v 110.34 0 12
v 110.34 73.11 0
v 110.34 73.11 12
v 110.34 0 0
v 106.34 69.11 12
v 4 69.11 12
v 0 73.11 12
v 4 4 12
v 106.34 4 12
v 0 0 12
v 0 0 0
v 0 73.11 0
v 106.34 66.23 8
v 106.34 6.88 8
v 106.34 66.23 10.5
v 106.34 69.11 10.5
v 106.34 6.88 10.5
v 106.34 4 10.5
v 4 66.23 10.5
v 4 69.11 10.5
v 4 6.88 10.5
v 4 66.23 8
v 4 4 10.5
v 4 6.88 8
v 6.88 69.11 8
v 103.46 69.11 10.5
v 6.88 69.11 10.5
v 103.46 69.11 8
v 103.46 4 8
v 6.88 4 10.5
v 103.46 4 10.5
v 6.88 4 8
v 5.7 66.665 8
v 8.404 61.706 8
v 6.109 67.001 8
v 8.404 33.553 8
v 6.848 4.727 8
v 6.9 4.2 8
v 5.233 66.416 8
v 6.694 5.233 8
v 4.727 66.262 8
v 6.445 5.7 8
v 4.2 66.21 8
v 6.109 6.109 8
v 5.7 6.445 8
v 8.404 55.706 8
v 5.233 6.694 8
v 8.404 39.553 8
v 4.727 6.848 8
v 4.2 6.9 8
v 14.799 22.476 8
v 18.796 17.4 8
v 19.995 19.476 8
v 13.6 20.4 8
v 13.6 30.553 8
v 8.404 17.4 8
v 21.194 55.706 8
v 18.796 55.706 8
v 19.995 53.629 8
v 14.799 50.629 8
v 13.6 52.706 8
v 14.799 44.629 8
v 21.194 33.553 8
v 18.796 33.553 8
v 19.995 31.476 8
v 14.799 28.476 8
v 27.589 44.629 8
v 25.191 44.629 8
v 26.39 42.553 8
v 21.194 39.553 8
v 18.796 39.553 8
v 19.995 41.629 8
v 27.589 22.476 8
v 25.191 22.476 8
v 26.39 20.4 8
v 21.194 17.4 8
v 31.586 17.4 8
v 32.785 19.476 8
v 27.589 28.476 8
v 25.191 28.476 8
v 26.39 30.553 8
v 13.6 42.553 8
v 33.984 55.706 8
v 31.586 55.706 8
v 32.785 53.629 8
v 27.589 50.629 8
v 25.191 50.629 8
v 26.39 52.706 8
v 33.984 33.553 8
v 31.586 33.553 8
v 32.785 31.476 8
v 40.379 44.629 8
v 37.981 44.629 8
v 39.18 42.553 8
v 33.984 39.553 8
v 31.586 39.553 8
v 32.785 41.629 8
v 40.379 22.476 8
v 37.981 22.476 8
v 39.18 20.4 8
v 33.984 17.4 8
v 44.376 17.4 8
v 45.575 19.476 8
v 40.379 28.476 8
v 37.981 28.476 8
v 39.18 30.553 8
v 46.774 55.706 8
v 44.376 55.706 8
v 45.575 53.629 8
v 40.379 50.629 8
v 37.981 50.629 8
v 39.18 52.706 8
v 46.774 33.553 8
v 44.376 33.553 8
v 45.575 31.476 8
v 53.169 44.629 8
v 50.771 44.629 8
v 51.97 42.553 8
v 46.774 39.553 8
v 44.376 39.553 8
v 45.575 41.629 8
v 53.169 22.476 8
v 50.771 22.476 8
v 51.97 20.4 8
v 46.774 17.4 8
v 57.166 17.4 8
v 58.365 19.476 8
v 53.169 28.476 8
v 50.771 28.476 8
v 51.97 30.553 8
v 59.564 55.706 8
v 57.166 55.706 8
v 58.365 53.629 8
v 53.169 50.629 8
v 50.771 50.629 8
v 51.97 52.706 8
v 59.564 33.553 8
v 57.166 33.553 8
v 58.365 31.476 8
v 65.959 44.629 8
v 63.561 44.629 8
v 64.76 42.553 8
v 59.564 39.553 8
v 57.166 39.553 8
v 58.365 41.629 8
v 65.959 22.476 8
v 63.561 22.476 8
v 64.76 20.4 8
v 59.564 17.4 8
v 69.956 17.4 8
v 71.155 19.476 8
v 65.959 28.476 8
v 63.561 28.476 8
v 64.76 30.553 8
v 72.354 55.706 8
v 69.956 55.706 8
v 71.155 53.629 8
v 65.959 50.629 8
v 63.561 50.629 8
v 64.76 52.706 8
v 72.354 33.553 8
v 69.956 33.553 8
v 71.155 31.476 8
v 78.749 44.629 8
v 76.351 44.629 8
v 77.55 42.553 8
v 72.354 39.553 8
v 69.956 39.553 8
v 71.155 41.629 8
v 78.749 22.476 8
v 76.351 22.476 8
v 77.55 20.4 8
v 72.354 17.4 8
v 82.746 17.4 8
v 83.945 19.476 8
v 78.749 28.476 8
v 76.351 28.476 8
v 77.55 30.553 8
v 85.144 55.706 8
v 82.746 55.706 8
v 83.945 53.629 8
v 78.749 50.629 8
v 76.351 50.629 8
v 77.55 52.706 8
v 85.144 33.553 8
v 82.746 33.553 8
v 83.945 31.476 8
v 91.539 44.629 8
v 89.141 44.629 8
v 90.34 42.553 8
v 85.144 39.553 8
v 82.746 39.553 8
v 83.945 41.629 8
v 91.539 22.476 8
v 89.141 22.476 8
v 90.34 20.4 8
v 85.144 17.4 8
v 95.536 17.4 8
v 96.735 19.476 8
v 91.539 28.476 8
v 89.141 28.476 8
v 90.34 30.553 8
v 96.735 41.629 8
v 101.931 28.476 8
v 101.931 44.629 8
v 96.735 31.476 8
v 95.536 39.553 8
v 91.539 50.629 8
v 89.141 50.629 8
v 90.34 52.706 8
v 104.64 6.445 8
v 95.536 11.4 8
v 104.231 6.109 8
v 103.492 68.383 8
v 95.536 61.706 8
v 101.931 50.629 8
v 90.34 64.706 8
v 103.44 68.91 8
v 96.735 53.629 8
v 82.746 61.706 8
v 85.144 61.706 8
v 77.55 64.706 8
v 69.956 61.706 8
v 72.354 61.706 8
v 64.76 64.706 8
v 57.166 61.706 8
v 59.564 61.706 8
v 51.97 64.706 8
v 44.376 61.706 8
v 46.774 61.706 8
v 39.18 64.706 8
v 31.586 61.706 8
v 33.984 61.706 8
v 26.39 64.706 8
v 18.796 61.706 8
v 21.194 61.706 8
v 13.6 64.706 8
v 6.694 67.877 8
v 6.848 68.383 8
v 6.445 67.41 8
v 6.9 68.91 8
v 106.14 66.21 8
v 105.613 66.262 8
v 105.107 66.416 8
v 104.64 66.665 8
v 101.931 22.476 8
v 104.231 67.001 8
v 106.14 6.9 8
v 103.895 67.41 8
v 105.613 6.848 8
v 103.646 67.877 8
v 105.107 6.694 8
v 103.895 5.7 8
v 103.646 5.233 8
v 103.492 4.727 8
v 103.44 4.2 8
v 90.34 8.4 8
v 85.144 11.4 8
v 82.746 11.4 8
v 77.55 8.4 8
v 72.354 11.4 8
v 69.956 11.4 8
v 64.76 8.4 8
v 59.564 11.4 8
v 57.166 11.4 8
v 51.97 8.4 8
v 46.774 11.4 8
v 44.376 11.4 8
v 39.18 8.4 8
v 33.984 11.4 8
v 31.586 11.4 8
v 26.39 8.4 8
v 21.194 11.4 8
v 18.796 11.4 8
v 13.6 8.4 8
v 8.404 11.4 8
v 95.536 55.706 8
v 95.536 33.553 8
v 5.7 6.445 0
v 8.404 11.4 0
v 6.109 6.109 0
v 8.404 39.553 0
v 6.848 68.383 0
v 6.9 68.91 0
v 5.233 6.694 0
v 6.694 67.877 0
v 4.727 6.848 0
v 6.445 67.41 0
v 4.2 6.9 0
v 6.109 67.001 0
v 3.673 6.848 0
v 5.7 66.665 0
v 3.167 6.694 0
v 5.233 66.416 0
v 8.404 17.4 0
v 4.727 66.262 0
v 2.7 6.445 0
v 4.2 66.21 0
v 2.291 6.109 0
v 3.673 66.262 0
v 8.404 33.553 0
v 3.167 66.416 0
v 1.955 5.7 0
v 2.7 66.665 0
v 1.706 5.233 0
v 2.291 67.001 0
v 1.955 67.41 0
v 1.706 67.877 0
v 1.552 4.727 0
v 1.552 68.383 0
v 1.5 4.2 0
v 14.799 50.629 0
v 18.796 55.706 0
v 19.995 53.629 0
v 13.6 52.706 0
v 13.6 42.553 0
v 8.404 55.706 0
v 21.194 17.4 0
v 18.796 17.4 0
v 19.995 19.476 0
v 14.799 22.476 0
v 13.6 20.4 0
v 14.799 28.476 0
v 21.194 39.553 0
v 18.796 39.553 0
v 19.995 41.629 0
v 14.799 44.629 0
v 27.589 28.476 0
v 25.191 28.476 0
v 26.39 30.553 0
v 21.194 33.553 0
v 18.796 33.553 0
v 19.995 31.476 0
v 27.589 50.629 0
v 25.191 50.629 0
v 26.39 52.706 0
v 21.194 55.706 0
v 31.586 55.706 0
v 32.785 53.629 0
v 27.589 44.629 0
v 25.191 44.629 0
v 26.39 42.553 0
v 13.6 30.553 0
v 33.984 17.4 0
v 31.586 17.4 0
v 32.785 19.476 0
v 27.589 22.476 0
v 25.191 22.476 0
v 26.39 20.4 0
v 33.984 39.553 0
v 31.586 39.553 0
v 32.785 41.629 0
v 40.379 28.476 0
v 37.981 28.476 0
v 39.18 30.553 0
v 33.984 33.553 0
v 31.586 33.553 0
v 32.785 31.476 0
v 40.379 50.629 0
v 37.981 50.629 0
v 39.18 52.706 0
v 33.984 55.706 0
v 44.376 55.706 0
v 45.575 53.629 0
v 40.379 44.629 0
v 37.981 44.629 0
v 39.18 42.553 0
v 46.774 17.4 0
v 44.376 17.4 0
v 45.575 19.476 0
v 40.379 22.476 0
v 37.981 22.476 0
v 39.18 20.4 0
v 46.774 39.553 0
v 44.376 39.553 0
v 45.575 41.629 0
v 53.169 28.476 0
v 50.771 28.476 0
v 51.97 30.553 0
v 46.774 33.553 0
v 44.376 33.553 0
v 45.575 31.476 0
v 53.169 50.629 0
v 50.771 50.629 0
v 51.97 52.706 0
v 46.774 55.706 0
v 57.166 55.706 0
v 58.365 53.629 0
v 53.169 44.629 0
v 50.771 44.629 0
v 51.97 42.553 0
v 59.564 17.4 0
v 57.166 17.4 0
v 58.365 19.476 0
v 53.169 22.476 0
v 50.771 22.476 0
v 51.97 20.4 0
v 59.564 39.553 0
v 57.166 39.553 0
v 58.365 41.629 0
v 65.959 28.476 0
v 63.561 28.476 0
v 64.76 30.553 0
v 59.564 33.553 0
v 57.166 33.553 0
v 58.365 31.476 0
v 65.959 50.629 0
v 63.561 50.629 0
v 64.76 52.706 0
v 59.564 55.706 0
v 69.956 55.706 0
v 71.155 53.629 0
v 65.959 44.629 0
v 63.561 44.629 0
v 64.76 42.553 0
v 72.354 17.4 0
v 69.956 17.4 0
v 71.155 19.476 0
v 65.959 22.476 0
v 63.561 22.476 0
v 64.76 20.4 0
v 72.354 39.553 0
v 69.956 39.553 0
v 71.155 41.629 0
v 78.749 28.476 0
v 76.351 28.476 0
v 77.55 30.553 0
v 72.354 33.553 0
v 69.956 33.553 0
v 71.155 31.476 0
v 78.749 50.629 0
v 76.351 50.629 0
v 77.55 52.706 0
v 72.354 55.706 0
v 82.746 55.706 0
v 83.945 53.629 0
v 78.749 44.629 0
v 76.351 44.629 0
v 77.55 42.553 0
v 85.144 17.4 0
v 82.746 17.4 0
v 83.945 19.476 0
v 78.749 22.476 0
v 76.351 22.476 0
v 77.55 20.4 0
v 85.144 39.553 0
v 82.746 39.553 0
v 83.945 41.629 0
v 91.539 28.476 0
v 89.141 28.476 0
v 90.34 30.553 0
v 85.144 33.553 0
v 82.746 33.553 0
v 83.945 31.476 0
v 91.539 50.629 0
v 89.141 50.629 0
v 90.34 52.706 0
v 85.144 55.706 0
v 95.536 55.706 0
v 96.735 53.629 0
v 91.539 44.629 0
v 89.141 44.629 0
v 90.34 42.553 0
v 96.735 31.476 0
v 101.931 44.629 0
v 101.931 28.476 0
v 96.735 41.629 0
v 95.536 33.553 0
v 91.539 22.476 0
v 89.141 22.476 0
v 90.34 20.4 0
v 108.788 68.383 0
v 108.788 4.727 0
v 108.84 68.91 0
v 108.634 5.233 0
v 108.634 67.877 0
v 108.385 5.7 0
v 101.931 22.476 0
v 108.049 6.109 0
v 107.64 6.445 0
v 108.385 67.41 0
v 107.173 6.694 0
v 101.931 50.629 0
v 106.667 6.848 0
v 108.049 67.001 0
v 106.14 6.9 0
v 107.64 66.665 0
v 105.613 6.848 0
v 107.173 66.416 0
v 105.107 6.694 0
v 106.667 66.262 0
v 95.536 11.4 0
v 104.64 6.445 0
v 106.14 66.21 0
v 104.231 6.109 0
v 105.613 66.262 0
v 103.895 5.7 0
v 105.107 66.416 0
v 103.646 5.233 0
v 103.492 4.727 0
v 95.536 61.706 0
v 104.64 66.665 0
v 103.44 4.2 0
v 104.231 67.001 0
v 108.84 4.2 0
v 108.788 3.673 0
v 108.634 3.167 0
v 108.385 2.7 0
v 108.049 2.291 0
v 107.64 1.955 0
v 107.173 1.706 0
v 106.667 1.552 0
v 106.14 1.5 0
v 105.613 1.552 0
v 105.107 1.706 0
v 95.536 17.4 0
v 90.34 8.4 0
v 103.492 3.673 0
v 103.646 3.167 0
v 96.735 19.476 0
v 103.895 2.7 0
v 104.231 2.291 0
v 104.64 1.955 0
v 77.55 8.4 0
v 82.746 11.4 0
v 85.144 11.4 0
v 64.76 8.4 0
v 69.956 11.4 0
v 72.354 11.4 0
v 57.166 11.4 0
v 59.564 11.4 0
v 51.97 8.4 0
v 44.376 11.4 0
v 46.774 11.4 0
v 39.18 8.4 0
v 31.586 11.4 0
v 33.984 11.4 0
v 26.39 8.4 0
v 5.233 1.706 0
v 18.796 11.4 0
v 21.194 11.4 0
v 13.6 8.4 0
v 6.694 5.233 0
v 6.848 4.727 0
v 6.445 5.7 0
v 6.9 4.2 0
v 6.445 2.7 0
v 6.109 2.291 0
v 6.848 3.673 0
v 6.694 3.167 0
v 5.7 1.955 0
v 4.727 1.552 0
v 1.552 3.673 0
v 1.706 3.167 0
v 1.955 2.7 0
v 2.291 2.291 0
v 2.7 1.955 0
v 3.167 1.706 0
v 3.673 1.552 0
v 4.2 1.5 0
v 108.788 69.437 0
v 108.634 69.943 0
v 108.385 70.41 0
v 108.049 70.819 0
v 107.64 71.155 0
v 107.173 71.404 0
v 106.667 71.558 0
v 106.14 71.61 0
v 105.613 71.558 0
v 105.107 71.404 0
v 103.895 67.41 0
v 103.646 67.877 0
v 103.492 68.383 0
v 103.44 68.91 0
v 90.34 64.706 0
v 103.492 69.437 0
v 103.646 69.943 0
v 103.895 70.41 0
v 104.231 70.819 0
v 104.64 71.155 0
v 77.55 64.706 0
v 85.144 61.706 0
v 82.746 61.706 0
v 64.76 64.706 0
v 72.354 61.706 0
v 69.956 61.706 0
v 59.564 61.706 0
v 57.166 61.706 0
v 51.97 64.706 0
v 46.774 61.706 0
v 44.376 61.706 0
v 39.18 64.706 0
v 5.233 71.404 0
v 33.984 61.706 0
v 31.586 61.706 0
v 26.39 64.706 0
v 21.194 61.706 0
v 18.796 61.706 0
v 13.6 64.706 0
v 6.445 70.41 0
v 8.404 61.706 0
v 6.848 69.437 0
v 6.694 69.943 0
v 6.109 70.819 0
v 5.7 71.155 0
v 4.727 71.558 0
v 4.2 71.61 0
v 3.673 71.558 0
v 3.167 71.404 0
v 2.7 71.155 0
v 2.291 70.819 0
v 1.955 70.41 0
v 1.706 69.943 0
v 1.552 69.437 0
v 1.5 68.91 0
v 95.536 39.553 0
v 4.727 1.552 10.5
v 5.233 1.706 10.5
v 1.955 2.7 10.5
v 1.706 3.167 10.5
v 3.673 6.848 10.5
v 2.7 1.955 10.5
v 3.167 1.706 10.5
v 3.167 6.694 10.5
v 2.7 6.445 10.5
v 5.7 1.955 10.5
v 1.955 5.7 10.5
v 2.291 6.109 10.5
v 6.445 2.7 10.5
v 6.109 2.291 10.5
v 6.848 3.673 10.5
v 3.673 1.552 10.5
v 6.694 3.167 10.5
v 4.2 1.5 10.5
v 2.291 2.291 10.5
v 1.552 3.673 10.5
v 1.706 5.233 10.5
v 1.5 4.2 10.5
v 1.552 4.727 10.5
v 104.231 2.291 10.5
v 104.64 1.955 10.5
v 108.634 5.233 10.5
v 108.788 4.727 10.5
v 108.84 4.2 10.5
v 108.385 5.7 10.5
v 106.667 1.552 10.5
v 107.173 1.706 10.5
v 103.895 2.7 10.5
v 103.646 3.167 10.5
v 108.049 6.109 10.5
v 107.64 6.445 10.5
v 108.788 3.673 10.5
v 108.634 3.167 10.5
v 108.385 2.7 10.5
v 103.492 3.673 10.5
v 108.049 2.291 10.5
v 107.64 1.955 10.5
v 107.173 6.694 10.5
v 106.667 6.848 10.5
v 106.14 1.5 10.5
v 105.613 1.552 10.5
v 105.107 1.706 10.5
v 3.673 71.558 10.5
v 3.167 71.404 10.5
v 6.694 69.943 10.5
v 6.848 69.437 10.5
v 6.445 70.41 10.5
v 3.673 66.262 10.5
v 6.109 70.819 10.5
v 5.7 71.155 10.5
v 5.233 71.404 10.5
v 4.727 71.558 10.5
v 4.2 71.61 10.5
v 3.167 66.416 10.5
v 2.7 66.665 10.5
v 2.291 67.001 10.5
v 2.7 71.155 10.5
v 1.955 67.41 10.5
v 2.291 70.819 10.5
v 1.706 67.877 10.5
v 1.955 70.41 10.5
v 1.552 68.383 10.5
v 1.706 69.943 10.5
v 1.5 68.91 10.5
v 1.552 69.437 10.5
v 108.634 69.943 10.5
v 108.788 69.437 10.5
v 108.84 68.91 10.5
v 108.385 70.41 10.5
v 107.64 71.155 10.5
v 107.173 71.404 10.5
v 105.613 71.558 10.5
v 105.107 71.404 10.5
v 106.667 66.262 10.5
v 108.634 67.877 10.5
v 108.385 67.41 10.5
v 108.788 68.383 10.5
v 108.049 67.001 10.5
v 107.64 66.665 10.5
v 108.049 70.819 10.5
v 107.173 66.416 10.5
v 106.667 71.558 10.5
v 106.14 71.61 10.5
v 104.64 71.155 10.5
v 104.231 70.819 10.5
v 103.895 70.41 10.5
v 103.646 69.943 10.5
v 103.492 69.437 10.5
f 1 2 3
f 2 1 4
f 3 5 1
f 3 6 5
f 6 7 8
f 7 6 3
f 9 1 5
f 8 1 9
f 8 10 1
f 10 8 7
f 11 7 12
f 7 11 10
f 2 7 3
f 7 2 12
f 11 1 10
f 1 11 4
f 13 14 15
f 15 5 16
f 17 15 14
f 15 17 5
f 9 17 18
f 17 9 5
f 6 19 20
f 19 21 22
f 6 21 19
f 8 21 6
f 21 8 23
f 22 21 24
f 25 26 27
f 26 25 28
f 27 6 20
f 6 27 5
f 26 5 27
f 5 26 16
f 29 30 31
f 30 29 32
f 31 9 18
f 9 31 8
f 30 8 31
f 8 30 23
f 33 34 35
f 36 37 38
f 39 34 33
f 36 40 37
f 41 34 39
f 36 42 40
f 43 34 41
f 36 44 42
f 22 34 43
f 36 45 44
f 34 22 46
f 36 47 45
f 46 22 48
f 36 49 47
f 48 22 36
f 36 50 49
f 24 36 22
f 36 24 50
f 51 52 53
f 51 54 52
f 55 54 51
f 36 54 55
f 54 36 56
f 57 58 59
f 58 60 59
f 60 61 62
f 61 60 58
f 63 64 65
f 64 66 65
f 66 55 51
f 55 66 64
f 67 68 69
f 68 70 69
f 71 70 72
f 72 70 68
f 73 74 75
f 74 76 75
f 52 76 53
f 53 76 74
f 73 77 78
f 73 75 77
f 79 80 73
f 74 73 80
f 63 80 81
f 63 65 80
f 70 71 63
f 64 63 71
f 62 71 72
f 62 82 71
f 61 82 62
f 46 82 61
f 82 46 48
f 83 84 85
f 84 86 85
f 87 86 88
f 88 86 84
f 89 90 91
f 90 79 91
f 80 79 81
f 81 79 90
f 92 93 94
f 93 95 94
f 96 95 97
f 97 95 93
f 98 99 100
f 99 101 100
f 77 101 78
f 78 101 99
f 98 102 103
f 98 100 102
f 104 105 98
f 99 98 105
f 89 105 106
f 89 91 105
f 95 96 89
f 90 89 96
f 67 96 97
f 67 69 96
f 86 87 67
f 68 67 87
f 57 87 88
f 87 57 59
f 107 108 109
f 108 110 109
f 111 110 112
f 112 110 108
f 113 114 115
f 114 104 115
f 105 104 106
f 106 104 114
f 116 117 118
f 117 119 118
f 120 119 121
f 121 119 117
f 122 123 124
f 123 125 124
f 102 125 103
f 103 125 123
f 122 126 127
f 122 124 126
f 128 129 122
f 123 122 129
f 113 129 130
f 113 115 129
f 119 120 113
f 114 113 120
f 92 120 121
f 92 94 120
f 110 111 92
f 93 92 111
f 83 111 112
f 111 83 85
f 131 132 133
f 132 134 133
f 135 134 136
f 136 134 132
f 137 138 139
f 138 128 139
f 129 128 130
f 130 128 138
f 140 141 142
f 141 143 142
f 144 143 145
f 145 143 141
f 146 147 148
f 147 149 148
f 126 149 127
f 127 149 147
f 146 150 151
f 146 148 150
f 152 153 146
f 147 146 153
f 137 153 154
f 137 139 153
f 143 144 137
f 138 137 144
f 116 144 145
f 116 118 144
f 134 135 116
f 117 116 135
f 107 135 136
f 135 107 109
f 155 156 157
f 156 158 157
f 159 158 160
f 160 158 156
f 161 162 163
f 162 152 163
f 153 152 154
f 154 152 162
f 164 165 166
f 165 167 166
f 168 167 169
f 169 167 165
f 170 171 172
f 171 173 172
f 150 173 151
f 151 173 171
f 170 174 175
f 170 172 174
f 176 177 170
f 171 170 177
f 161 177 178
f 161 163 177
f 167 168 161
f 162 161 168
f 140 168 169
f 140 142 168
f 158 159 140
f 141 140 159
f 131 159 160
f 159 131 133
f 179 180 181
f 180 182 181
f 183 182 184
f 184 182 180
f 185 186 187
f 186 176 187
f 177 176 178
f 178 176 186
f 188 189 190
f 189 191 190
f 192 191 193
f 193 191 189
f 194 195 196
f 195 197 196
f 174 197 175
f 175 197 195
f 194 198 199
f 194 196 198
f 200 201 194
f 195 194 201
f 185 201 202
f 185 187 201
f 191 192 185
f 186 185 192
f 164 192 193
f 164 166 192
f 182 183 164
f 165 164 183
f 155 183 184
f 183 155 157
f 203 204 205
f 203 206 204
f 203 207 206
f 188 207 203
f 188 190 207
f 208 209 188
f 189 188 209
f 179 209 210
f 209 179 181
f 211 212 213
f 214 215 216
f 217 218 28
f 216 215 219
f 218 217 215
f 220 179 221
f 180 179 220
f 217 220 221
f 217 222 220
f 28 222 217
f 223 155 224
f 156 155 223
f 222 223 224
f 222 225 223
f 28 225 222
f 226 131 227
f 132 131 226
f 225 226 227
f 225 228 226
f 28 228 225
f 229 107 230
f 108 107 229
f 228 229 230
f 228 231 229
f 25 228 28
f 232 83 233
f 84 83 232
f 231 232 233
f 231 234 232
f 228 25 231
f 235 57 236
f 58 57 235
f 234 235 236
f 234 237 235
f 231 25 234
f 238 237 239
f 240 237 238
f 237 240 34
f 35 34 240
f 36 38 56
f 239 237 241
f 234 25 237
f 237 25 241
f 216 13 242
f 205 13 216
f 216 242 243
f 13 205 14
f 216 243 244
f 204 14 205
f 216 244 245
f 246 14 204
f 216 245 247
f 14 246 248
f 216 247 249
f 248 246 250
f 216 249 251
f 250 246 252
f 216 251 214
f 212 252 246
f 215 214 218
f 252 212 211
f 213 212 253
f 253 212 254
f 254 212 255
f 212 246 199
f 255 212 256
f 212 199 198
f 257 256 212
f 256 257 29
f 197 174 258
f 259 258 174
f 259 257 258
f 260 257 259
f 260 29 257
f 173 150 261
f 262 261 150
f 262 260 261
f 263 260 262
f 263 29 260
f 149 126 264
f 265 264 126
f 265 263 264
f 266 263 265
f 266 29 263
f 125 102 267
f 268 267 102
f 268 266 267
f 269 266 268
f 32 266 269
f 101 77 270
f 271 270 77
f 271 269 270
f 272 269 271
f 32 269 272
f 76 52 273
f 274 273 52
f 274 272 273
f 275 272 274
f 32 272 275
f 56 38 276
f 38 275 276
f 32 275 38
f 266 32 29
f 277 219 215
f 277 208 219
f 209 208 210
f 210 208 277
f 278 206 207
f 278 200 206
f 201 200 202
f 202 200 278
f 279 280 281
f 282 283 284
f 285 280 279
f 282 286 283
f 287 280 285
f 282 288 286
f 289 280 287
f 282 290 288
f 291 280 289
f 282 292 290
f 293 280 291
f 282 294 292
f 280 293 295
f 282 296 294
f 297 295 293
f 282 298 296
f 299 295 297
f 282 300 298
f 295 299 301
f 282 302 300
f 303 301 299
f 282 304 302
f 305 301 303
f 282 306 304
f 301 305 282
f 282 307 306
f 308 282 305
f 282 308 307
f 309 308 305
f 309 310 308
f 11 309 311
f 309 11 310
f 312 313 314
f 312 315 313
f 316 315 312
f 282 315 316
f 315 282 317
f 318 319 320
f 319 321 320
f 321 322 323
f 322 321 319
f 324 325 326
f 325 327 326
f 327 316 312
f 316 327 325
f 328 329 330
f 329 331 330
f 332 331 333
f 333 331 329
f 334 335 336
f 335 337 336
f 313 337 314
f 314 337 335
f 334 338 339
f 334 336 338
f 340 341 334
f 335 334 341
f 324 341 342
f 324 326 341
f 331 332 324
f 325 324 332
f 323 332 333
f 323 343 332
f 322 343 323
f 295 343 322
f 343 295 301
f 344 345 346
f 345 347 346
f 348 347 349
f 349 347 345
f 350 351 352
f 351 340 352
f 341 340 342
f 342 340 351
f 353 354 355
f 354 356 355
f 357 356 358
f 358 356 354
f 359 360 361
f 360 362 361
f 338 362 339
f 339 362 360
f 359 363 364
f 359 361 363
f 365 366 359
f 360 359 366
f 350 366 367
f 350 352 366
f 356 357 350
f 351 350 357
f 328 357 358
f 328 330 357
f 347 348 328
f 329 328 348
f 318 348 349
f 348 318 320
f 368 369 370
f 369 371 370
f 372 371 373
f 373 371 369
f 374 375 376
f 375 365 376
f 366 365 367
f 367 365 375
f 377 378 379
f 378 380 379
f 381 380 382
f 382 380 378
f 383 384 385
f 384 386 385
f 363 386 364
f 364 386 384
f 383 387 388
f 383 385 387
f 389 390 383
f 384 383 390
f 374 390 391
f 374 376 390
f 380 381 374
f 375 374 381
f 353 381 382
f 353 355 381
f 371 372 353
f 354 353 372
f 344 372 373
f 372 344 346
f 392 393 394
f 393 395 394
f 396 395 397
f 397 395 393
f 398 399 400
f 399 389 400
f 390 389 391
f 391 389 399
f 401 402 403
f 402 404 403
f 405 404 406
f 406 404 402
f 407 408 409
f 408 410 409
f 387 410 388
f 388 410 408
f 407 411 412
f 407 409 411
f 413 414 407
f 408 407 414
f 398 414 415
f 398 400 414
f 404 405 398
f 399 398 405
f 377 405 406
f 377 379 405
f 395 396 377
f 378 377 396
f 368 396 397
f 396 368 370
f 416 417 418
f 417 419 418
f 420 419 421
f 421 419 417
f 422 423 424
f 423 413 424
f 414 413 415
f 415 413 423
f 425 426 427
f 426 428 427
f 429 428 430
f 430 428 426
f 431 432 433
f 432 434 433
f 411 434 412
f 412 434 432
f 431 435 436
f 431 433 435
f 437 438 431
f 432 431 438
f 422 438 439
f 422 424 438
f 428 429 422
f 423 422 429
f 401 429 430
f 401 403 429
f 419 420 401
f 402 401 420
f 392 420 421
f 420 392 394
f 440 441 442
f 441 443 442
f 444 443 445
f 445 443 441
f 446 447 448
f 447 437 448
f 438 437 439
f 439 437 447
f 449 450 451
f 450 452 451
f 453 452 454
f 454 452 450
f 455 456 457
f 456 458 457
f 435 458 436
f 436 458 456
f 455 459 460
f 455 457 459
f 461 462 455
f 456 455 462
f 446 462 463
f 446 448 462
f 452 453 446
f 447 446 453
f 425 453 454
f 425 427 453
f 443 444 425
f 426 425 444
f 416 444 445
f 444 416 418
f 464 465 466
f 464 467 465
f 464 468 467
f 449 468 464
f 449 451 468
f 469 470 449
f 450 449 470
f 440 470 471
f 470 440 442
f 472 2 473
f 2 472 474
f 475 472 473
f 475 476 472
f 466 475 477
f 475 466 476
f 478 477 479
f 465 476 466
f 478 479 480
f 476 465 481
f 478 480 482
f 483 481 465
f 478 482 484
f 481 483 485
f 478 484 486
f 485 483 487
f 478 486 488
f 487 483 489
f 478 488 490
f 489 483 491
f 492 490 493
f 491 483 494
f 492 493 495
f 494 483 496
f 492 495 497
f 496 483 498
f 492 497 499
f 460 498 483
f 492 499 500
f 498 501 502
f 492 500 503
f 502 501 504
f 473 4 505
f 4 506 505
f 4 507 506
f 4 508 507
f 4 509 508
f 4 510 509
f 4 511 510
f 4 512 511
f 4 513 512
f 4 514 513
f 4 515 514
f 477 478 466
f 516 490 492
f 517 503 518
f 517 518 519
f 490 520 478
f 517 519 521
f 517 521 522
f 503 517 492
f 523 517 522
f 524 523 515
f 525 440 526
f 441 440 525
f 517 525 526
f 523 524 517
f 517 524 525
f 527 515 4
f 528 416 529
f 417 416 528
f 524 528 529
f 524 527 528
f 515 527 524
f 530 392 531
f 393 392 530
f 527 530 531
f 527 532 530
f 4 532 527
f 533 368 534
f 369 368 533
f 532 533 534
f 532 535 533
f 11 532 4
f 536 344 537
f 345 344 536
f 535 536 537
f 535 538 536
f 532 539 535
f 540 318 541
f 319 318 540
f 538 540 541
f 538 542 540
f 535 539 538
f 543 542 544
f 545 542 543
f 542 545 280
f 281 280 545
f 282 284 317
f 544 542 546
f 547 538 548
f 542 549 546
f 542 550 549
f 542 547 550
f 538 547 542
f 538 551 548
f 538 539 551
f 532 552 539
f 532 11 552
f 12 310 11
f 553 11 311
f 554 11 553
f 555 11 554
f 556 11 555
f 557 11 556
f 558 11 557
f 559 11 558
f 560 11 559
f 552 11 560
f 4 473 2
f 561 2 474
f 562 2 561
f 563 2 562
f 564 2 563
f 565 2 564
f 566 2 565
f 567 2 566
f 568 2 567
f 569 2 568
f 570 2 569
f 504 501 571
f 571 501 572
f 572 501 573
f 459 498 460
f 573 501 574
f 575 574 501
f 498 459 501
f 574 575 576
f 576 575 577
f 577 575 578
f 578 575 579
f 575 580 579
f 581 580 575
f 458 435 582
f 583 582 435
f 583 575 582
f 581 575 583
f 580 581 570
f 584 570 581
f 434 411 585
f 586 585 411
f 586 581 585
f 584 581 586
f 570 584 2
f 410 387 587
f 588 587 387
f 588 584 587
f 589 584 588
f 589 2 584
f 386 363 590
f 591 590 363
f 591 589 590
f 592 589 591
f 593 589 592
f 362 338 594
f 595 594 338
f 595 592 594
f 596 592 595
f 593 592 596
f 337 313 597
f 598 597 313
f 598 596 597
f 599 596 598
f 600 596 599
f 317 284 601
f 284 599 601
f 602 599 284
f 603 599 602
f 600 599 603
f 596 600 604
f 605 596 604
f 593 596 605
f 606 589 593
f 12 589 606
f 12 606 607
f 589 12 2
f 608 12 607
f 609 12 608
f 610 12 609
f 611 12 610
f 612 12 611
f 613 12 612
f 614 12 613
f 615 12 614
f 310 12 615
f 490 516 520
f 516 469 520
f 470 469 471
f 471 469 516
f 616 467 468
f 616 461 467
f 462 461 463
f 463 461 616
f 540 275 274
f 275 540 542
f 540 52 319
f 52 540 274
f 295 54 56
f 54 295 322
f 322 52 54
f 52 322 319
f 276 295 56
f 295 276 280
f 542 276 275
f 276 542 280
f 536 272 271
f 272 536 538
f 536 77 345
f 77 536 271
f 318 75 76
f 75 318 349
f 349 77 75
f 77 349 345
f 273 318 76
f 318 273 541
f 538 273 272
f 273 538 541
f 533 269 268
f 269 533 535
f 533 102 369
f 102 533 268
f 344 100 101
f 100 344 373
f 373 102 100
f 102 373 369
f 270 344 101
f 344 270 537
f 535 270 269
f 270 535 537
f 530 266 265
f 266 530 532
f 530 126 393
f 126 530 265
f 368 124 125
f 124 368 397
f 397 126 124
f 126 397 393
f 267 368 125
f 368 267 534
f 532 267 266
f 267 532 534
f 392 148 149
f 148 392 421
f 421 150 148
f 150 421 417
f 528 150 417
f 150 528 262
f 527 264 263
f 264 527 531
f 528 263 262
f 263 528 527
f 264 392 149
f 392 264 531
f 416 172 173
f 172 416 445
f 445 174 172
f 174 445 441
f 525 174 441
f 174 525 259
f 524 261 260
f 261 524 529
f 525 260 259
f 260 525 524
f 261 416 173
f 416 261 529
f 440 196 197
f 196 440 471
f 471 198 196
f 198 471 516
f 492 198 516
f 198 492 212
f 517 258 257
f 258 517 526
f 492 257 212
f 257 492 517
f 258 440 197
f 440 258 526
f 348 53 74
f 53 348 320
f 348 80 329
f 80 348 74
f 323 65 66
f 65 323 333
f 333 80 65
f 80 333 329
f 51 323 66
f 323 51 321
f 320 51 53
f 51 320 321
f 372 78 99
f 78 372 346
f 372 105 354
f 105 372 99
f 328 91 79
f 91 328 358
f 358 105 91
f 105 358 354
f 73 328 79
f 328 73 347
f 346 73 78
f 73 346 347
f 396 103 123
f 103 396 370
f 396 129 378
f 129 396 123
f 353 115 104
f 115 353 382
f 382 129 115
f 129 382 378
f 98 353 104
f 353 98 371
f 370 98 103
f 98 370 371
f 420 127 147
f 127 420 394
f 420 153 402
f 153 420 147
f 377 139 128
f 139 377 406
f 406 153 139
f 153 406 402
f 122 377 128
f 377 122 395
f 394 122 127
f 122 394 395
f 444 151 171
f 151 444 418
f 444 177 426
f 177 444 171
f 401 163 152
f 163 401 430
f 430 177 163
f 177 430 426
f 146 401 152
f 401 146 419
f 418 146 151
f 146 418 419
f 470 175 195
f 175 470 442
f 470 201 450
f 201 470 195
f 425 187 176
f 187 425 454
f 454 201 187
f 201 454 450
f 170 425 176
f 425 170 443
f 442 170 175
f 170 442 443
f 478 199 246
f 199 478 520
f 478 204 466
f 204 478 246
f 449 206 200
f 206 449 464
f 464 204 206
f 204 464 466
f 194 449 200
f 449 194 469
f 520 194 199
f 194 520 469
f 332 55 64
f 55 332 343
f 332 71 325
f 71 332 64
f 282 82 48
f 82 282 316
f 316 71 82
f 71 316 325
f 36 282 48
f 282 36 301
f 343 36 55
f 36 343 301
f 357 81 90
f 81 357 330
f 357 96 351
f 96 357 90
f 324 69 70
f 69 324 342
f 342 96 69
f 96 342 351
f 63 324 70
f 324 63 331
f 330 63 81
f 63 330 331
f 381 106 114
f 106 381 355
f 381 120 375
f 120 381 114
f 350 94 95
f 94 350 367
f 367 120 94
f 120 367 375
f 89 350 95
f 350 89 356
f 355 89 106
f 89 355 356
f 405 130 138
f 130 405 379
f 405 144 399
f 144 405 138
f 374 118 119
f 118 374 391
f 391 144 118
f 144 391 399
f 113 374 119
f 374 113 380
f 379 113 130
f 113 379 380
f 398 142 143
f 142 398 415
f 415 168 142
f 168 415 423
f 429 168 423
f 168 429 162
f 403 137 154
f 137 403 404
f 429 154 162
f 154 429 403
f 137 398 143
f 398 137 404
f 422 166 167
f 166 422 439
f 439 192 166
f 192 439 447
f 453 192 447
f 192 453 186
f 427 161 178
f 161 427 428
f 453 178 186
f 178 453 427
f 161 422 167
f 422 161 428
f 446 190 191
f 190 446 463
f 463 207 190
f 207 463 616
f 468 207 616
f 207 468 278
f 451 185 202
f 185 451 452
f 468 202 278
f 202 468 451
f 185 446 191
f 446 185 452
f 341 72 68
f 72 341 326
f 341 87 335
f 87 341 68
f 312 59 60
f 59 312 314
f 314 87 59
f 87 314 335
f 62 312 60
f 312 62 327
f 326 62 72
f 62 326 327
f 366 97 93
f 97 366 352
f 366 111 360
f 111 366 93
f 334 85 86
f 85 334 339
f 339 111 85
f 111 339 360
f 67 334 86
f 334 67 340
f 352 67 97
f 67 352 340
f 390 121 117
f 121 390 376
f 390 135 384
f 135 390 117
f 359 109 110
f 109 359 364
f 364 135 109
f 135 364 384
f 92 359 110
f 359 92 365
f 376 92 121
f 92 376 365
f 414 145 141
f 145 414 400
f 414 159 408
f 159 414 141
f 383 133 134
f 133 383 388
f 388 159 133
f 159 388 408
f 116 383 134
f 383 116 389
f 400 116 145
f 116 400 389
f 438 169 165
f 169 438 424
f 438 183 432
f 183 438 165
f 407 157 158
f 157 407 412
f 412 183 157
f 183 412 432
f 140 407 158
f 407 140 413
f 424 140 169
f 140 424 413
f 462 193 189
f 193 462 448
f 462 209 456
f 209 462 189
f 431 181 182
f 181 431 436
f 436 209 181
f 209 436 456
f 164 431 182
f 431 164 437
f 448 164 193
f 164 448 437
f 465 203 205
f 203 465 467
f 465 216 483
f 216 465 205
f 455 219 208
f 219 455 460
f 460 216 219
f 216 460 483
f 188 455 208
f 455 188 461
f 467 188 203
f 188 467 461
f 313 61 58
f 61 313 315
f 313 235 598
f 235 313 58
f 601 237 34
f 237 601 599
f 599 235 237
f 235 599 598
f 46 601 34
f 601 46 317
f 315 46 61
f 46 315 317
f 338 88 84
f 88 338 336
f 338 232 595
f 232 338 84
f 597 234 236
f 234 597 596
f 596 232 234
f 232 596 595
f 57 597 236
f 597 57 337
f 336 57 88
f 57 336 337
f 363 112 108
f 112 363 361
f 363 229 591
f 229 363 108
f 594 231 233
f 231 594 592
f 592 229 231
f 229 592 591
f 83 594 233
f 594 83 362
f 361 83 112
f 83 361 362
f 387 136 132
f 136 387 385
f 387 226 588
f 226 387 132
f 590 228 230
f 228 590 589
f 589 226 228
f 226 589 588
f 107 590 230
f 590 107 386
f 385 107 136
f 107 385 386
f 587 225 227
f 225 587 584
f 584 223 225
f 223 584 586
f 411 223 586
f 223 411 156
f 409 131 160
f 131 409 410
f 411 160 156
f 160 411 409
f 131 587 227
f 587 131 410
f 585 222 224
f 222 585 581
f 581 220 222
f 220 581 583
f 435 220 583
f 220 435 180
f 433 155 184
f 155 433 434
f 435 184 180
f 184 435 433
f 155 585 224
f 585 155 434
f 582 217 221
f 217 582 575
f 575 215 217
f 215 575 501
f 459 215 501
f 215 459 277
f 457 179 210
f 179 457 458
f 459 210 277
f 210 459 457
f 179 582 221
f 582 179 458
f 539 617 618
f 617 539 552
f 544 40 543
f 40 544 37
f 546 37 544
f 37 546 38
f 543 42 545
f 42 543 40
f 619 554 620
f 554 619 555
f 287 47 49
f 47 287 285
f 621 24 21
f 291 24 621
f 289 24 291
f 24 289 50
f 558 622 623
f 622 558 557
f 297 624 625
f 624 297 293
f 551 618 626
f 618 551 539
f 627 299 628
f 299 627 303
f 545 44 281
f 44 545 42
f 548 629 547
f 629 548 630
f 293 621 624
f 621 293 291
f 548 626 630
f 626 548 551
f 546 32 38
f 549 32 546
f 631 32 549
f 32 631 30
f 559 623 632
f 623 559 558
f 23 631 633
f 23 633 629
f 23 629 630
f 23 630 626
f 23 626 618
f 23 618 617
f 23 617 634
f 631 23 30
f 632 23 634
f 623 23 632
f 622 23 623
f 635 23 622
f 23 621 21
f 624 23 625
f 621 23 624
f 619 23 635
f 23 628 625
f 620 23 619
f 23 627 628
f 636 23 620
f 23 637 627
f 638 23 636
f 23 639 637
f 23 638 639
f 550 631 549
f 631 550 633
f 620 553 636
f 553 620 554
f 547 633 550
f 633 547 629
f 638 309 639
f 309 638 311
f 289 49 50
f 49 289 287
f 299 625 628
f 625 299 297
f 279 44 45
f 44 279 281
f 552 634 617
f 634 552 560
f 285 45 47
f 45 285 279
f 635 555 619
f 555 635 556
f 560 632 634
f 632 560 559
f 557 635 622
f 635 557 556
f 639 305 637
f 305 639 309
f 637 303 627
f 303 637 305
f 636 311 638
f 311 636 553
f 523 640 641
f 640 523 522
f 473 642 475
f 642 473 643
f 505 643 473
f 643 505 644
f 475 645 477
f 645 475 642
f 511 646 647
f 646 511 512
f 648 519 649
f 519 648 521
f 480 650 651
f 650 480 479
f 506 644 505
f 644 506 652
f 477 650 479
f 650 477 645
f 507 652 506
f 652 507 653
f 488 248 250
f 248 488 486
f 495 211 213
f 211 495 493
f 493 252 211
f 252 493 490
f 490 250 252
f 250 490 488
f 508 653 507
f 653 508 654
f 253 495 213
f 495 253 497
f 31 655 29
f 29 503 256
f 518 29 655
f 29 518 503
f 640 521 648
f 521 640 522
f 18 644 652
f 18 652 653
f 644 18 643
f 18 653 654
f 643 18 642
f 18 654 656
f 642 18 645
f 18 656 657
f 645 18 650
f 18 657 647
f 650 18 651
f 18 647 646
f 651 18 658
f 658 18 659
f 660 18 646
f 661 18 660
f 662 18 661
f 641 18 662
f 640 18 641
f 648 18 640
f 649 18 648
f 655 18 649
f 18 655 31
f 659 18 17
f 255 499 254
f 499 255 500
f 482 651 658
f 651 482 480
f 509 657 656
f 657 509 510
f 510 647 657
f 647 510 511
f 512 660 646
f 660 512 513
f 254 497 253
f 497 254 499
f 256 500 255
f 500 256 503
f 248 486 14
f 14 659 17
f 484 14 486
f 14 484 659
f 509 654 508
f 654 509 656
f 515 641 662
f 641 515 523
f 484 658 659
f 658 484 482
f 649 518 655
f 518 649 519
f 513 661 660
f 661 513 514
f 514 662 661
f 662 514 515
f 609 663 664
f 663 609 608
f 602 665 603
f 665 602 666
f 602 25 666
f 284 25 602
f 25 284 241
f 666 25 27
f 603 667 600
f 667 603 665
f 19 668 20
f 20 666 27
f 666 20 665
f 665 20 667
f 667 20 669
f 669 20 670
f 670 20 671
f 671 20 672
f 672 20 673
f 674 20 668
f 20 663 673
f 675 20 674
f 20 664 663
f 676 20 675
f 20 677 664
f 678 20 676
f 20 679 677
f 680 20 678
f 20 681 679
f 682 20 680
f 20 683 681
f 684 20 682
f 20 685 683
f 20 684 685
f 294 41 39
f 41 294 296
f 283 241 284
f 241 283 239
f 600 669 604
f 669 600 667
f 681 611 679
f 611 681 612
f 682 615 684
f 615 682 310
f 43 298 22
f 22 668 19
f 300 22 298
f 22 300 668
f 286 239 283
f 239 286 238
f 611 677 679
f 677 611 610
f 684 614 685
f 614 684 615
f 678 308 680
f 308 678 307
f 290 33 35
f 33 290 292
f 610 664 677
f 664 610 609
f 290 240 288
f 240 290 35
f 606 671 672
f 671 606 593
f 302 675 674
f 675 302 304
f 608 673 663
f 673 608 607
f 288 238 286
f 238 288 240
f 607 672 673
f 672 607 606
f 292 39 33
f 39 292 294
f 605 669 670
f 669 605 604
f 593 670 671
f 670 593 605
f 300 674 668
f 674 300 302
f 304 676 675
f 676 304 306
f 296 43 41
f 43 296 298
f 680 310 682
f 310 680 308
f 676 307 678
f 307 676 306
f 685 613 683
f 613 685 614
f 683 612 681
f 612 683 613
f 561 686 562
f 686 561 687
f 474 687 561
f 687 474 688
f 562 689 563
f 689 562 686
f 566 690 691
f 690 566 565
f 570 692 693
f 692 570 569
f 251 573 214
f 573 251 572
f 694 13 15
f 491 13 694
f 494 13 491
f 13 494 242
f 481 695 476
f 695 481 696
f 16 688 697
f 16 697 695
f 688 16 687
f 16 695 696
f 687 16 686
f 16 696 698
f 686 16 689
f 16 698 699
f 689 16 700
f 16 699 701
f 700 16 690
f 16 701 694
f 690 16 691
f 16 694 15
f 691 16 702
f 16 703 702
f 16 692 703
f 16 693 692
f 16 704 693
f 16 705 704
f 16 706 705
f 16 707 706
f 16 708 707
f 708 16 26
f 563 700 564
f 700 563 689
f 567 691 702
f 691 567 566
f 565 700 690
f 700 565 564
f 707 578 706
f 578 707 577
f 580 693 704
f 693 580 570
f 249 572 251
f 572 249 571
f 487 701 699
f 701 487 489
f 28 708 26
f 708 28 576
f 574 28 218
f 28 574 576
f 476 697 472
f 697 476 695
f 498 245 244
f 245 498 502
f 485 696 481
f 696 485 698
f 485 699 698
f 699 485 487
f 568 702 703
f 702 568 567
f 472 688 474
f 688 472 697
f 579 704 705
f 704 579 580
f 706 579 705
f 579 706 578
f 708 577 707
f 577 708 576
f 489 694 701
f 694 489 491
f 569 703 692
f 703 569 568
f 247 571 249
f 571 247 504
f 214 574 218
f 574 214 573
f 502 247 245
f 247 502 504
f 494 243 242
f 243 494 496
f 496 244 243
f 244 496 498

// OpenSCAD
$fn = 32;

// ----------------------------------------------------------------------
// Honeycomb panel: 110.34 x 73.11 mm, 35 cells of 12 mm
// ----------------------------------------------------------------------

// --- parameters (mm) ---
panel_w = 110.34;         // panel width
panel_d = 73.11;          // panel depth
thick = 8;                // panel thickness
cell_r = 6;               // hex cell circumradius
pitch = 12.79;            // hex cell pitch (centre to centre)
web = 2.4;                // web between the cells
columns = 7;              // columns of cells
rows = 5;                 // rows of cells
cell_count = 35;          // total cells
shift_x = 13.6;           // first cell offset in x
shift_y = 14.4;           // first cell offset in y
mount_d = 5.4;            // corner mounting holes
hole_off = 4.2;           // mounting hole offset from the corners
rim_h = 12;               // rim height
rim_t = 4;                // rim wall thickness

difference() {
  union() {
    cube([panel_w, panel_d, thick]);
    /* rim around the panel, sunk 1 mm into the plate */
    translate([0, 0, thick - 1]) difference() {
      cube([panel_w, panel_d, rim_h - thick + 1]);
      translate([rim_t, rim_t, -2.5]) cube([panel_w - 2 * rim_t, panel_d - 2 * rim_t, rim_h - thick + 6]);
    }
  }
  /* hexagonal cells, point-up, cut right through the plate */
  for (row = [0 : rows - 1]) {
    for (col = [0 : columns - 1]) {
      translate([shift_x + col * pitch + (row % 2) * pitch / 2, shift_y + row * pitch * 0.866025, -2.5]) rotate([0, 0, 30]) cylinder(h = thick + 5, d = 2 * cell_r, $fn = 6);
    }
  }
  /* corner mounting holes, clear of the outer cell web */
  translate([4.2, 4.2, -2.5]) cylinder(h = thick + 5, d = mount_d);
  translate([106.14, 4.2, -2.5]) cylinder(h = thick + 5, d = mount_d);
  translate([4.2, 68.91, -2.5]) cylinder(h = thick + 5, d = mount_d);
  translate([106.14, 68.91, -2.5]) cylinder(h = thick + 5, d = mount_d);
}
